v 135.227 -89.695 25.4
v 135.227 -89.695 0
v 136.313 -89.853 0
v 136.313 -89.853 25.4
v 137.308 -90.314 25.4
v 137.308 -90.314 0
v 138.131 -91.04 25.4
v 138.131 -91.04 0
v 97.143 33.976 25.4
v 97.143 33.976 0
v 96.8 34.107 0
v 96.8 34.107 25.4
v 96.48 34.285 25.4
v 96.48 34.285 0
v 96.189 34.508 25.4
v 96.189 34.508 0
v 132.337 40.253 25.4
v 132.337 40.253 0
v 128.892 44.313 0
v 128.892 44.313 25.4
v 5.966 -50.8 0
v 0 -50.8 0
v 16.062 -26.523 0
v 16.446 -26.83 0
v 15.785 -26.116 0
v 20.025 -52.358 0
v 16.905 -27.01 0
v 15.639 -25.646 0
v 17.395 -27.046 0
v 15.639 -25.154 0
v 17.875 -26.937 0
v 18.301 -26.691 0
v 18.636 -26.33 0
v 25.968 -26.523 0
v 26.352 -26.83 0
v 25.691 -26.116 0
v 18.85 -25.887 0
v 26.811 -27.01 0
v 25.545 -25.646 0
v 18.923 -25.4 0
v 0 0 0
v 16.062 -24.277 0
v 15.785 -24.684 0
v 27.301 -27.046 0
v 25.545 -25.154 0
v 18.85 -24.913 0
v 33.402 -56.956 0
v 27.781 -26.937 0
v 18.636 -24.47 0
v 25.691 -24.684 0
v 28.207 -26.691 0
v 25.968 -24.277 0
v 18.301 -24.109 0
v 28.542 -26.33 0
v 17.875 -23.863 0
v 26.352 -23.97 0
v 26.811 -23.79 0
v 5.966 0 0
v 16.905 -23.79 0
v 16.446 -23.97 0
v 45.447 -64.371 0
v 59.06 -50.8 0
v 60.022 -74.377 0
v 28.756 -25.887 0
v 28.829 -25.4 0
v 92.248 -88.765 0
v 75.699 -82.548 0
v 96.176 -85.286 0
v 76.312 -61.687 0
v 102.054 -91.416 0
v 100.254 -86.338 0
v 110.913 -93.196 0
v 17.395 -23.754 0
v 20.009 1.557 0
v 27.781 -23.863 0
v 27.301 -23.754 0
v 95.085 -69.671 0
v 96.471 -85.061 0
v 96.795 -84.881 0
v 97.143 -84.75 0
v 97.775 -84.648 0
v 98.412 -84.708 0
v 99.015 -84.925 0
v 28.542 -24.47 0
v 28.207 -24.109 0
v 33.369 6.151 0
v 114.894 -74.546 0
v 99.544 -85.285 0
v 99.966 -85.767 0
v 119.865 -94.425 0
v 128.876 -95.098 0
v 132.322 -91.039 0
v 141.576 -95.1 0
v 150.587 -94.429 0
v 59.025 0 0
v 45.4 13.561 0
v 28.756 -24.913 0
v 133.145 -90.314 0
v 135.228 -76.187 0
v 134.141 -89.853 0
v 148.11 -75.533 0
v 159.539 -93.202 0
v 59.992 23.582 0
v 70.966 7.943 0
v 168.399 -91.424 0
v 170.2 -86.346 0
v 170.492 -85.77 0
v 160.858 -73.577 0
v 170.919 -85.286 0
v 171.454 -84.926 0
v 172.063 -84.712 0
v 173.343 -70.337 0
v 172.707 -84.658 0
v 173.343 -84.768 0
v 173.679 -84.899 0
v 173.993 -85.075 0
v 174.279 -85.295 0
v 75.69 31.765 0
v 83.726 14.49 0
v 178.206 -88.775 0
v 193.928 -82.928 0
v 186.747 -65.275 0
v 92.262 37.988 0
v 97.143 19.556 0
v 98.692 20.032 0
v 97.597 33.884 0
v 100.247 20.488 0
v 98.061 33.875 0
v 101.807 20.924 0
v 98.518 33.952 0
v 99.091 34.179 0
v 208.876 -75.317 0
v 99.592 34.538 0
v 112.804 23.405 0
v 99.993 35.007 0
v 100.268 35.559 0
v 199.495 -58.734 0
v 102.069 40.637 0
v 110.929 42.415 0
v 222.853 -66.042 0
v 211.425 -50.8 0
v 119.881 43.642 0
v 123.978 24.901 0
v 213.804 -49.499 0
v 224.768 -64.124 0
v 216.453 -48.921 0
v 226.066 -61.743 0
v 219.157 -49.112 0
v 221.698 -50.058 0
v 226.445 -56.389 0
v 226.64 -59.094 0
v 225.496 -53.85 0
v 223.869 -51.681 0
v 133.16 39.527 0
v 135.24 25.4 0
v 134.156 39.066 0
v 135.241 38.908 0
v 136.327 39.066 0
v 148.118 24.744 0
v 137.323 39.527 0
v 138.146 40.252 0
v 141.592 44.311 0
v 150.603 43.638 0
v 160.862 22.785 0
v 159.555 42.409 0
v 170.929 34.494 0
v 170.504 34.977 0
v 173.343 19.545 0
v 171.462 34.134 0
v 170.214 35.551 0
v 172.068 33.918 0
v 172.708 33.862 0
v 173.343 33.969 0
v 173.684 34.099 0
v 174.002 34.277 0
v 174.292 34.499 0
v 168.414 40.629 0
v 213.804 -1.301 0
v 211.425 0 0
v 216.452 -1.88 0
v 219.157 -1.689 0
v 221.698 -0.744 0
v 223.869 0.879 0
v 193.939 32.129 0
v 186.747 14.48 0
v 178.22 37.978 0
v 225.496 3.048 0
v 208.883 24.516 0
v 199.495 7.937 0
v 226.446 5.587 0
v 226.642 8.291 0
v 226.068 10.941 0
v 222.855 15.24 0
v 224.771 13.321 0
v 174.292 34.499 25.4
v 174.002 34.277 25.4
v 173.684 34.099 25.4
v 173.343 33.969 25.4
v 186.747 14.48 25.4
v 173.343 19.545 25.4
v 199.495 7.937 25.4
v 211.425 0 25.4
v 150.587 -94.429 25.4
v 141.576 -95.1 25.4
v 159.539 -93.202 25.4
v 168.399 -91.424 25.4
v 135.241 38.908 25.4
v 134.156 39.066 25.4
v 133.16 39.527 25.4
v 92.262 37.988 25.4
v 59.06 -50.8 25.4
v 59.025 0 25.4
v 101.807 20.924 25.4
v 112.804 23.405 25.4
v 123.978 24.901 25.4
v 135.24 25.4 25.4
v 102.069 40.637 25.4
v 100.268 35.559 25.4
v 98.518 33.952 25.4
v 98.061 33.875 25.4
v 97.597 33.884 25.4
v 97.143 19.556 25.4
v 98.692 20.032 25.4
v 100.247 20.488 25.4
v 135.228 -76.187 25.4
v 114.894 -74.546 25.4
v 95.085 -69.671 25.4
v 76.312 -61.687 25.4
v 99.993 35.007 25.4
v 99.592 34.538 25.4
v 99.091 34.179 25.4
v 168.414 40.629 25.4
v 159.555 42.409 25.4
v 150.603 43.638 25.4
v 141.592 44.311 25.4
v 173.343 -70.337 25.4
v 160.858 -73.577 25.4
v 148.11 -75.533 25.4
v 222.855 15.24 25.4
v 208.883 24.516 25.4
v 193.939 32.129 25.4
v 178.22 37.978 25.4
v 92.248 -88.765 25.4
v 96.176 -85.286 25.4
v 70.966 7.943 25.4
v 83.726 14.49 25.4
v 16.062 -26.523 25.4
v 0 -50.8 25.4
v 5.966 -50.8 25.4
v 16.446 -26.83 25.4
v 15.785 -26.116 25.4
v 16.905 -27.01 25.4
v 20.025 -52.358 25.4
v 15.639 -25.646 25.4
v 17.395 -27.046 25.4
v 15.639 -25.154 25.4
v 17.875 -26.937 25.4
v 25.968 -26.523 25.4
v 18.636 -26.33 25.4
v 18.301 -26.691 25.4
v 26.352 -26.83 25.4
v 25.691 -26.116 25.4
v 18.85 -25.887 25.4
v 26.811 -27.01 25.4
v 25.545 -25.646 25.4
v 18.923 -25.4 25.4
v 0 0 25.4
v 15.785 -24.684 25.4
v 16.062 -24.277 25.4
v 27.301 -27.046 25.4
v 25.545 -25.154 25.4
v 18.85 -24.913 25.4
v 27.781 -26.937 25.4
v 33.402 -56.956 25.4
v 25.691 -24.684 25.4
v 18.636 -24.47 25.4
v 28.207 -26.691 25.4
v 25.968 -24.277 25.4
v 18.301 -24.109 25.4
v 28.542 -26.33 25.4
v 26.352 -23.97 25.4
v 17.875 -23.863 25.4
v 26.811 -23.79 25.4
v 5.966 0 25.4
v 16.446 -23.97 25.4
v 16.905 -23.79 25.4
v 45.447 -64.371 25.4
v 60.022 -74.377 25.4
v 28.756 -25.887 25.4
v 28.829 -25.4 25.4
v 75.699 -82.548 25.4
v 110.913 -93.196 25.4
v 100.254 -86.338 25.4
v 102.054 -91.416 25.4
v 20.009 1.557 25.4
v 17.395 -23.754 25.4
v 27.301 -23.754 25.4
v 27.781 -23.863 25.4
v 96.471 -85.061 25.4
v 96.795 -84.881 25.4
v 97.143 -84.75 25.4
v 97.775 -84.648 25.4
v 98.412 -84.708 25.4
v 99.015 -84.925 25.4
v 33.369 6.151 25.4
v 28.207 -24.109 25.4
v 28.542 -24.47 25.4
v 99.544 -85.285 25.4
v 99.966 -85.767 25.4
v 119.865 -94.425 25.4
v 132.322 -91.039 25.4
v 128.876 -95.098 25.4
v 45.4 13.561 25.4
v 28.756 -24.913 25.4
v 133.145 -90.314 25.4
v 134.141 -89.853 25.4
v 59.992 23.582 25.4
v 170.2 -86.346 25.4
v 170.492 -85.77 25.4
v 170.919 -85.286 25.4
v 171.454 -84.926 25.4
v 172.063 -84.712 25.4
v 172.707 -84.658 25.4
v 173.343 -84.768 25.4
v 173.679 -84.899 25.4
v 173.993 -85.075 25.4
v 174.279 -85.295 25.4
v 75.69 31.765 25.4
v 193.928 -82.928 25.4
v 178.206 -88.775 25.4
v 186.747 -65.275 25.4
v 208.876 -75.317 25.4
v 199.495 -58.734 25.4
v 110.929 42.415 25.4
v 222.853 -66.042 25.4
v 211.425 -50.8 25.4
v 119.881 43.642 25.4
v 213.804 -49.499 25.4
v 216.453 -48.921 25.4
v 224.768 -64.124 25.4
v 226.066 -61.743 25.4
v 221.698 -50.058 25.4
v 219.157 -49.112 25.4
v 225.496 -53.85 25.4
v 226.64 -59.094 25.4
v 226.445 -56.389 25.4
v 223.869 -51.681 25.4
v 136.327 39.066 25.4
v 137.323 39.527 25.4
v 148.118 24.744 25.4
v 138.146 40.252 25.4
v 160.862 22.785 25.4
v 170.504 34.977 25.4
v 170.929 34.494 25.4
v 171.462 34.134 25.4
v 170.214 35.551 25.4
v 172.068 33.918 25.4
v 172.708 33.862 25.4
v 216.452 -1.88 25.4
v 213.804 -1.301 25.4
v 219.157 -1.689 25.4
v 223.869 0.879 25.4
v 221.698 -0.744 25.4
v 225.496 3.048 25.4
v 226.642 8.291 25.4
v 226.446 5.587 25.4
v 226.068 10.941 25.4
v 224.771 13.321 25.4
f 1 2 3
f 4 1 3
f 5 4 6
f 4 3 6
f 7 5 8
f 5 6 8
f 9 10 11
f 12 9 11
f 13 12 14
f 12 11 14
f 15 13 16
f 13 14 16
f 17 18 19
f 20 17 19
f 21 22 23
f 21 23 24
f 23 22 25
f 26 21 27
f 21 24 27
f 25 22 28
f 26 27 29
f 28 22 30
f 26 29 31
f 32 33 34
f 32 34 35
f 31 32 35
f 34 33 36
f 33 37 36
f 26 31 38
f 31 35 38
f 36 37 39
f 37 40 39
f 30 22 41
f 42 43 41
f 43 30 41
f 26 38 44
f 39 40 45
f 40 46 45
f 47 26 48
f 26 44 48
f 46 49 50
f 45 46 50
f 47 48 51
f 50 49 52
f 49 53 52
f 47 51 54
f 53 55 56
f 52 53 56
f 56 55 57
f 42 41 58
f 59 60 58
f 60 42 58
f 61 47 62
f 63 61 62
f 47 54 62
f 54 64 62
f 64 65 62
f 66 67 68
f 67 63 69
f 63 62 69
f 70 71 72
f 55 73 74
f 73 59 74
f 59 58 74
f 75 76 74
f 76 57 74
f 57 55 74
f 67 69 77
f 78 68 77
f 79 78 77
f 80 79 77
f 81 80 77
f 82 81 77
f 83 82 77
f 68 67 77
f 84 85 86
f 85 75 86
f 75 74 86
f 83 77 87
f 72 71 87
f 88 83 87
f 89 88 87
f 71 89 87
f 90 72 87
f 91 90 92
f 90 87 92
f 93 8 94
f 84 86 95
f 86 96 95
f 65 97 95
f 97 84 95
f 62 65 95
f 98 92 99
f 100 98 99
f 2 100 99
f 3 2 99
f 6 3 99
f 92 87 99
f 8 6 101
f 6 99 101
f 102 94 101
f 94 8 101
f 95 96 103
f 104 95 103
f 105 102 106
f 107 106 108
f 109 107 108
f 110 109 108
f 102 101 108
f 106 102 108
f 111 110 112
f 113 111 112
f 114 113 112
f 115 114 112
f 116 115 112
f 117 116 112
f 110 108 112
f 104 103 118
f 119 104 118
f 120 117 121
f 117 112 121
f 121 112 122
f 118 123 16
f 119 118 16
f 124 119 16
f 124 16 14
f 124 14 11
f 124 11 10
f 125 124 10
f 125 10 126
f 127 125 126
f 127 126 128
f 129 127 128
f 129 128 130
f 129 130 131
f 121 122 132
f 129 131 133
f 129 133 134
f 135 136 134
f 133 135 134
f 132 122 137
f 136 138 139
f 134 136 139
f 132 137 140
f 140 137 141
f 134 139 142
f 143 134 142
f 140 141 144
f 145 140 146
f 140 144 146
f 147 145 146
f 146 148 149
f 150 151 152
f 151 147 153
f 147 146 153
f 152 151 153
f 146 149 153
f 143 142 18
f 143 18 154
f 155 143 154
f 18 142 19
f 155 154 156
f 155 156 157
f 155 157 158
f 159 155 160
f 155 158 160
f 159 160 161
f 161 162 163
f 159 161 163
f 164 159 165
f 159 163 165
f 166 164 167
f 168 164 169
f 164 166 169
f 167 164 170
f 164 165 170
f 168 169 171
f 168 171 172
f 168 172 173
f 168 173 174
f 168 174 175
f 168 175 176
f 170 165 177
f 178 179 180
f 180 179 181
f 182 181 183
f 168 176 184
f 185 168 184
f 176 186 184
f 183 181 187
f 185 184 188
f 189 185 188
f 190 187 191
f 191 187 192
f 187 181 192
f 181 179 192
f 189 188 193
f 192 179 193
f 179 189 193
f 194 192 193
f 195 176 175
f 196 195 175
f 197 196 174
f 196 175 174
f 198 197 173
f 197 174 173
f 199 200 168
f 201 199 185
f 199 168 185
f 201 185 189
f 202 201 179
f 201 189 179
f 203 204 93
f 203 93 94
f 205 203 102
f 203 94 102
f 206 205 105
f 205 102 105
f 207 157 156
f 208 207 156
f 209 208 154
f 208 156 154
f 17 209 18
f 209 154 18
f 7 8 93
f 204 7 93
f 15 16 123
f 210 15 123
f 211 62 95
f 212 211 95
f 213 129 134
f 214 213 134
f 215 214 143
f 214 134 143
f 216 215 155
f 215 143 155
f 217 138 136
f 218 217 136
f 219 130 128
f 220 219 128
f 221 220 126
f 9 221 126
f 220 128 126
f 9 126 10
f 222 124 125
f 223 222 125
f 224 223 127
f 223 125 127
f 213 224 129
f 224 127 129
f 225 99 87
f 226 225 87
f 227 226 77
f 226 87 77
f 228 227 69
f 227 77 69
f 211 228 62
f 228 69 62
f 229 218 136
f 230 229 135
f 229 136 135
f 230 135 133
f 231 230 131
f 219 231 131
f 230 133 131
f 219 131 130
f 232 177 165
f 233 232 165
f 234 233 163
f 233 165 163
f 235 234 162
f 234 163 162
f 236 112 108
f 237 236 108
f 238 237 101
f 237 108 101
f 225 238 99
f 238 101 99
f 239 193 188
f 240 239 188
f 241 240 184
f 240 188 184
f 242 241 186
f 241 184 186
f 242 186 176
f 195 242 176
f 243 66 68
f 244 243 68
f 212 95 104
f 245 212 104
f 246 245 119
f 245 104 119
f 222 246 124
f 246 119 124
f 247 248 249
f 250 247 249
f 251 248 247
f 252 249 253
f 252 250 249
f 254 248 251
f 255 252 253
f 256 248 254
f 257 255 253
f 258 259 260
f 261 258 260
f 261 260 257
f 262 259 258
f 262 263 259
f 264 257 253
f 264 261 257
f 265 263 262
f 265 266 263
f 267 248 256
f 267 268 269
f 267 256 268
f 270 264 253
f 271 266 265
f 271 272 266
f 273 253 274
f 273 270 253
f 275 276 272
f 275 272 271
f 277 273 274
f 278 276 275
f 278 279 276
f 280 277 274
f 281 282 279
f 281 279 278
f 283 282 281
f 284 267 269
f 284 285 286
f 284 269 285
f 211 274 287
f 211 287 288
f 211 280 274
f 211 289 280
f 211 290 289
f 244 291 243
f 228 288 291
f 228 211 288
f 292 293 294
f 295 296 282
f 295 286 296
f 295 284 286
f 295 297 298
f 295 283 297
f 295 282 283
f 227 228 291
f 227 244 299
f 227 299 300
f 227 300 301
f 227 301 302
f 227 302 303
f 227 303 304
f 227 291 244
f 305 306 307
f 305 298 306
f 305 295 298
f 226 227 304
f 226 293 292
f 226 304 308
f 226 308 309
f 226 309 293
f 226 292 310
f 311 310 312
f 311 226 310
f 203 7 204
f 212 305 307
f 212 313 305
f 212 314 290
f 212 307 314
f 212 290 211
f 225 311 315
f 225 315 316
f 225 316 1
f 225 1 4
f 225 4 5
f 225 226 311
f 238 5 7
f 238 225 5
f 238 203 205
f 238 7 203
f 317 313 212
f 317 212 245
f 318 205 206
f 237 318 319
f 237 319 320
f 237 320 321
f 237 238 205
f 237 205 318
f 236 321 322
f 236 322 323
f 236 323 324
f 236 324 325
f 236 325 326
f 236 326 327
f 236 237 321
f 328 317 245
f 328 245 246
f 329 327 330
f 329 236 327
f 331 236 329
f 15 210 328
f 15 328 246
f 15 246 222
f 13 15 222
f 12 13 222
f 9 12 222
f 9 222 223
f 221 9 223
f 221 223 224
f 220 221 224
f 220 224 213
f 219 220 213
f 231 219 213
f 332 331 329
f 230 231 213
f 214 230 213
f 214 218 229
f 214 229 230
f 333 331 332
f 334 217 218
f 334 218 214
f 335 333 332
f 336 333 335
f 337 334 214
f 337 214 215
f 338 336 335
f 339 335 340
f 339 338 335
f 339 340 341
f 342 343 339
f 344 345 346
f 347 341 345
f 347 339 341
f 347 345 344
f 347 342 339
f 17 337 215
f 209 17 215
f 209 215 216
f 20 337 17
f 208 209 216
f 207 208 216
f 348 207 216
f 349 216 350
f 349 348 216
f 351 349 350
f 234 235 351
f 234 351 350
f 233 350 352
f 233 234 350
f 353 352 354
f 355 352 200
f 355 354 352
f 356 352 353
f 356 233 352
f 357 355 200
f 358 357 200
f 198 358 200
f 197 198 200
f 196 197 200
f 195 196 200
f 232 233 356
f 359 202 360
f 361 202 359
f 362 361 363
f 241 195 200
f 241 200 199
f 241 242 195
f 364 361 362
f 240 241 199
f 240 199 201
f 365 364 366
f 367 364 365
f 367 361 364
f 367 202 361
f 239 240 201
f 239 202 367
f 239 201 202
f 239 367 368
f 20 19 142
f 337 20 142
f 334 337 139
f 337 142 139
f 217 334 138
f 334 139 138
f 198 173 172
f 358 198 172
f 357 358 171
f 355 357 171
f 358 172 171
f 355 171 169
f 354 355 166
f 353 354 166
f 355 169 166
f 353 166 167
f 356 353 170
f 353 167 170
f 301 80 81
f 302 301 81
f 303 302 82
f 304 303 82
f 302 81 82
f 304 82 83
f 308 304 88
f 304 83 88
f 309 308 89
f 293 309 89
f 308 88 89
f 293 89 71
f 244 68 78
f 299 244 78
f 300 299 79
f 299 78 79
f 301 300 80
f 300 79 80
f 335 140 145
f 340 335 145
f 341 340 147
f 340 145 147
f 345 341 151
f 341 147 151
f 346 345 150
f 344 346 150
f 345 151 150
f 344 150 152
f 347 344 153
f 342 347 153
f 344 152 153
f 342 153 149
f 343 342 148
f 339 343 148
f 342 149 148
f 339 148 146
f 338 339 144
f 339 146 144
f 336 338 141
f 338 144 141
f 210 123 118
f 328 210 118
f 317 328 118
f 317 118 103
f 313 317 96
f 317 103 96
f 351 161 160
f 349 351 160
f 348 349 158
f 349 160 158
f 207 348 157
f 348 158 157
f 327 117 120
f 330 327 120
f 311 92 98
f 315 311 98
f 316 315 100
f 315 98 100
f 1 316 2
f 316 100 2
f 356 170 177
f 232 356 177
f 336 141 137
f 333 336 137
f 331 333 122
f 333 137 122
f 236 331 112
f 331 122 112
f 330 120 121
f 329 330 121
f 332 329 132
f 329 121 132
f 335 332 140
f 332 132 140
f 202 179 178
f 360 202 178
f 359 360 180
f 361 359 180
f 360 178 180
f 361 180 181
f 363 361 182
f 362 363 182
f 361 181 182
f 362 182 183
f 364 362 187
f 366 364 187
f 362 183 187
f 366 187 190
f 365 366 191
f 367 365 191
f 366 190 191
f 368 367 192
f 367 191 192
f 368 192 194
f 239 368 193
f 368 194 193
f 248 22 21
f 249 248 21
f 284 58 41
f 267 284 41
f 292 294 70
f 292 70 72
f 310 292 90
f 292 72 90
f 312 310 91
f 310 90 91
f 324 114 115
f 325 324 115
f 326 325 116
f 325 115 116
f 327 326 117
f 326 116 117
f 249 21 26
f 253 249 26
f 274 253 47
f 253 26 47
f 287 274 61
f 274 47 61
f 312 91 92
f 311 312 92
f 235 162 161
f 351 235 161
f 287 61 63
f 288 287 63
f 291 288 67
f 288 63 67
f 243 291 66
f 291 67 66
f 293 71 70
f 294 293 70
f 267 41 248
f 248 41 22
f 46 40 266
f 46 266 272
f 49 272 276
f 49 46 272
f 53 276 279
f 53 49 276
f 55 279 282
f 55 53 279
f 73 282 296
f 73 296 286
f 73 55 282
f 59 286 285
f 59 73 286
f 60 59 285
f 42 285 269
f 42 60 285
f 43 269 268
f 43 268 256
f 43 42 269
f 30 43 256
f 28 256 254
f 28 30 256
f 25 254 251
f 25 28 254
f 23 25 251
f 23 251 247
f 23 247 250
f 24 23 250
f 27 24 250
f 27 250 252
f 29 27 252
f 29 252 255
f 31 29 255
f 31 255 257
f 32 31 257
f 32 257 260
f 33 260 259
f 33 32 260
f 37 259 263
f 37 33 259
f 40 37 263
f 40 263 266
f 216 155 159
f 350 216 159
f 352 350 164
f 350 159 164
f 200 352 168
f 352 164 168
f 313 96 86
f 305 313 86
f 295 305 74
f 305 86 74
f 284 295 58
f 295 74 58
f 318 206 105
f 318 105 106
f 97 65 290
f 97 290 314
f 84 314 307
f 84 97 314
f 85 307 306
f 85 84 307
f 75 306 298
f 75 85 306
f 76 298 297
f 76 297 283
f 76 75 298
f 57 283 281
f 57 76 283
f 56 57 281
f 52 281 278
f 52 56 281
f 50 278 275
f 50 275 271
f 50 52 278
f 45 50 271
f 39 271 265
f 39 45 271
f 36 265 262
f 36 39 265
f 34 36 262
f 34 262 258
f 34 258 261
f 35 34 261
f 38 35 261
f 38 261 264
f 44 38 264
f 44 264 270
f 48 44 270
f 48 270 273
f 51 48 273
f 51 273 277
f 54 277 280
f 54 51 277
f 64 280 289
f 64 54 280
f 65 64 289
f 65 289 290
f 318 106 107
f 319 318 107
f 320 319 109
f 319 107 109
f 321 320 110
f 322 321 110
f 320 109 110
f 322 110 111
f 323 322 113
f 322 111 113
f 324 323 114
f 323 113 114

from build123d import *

# Parameters (mm, degrees)
F0_R     = 1.651
F1_DEPTH = 25.4


with BuildPart() as f1:
    # F0 (on Top) → F1 (new body)
    with BuildSketch(Plane.XY):
        with BuildLine():
            Line((5.9660125897, 0), (0, 0))
            Line((0, 0), (0, -50.8))
            Line((0, -50.8), (5.9660125897, -50.8))
            ThreePointArc((5.9660125897, -50.8), (26.8404151011, -54.2874891517), (45.4474833472, -64.3711527752))
            ThreePointArc((45.4474833472, -64.3711527752), (67.7366219489, -78.6995467545), (92.2477625944, -88.7649606997))
            Line((92.2477625944, -88.7649606997), (96.1756392809, -85.285625491))
            ThreePointArc((96.1756392809, -85.285625491), (96.6297262922, -84.9647009914), (97.1427657695, -84.7502760791))
            Line((97.1427657695, -84.7502760791), (97.1427657695, -70.3371887059))
            ThreePointArc((97.1427657695, -70.3371887059), (77.2725114585, -62.1844747684), (59.0602220587, -50.8))
            Line((59.0602220587, -50.8), (59.0253094804, 0))
            ThreePointArc((59.0253094804, 0), (77.2534891322, 11.396761217), (97.1427657695, 19.555766947))
            Line((97.1427657695, 19.555766947), (97.1427657695, 33.9761360632))
            ThreePointArc((97.1427657695, 33.9761360632), (96.6371725478, 34.190077646), (96.1893595345, 34.5076607246))
            Line((96.1893595345, 34.5076607246), (92.2622799467, 37.987895583))
            ThreePointArc((92.2622799467, 37.987895583), (67.7168934482, 27.9114522536), (45.3996037793, 13.5605188218))
            ThreePointArc((45.3996037793, 13.5605188218), (26.8160472709, 3.4848333701), (5.9660125897, 0))
        make_face()
        with Locations((17.272, -25.4)):
            Circle(F0_R, mode=Mode.SUBTRACT)
        with Locations((27.178, -25.4)):
            Circle(F0_R, mode=Mode.SUBTRACT)
        with BuildLine():
            Line((173.3427657695, 33.9685711851), (173.3427657695, 19.5447874489))
            ThreePointArc((173.3427657695, 19.5447874489), (193.2134106927, 11.3884070061), (211.4253094804, 0))
            ThreePointArc((211.4253094804, 0), (224.7603094804, 1.905), (222.8553094804, 15.24))
            ThreePointArc((222.8553094804, 15.24), (201.5199367106, 28.5369467154), (178.2203126555, 37.9780505738))
            Line((178.2203126555, 37.9780505738), (174.292435969, 34.4987153651))
            ThreePointArc((174.292435969, 34.4987153651), (173.8463095868, 34.1822161077), (173.3427657695, 33.9685711851))
        make_face()
        with BuildLine():
            ThreePointArc((211.4253094804, -50.8), (193.2130200806, -62.1844747684), (173.3427657695, -70.3371887059))
            Line((173.3427657695, -70.3371887059), (173.3427657695, -84.7683622579))
            ThreePointArc((173.3427657695, -84.7683622579), (173.8388638616, -84.9814448856), (174.2787157154, -85.2945708506))
            Line((174.2787157154, -85.2945708506), (178.2057953033, -88.7748057089))
            ThreePointArc((178.2057953033, -88.7748057089), (201.5113077809, -79.337141934), (222.852691037, -66.0419634811))
            ThreePointArc((222.852691037, -66.0419634811), (224.7599819992, -52.7072909622), (211.4253094804, -50.8))
        make_face()
        with BuildLine():
            ThreePointArc((128.892021211, 44.312617548), (115.3953137669, 43.0975250998), (102.0693249913, 40.6367153465))
            Line((102.0693249913, 40.6367153465), (100.2677893758, 35.5592610119))
            ThreePointArc((100.2677893758, 35.5592610119), (99.5924476221, 34.538163122), (98.5179053993, 33.9515743424))
            Line((98.5179053993, 33.9515743424), (101.8073036013, 20.9244338206))
            ThreePointArc((101.8073036013, 20.9244338206), (118.374331468, 24.2771009359), (135.2398551386, 25.399999167))
            Line((135.2398551386, 25.399999167), (135.2414022457, 38.9079894532))
            ThreePointArc((135.2414022457, 38.9079894532), (133.6409701921, 39.2606320138), (132.3367275841, 40.2529478676))
            Line((132.3367275841, 40.2529478676), (128.892021211, 44.312617548))
        make_face()
        with BuildLine():
            ThreePointArc((98.5179053993, 33.9515743424), (97.8286414895, 33.8690077361), (97.1427657695, 33.9761360632))
            Line((97.1427657695, 33.9761360632), (97.1427657695, 19.555766947))
            ThreePointArc((97.1427657695, 19.555766947), (99.468485514, 20.2624205399), (101.8073036013, 20.9244338206))
            Line((101.8073036013, 20.9244338206), (98.5179053993, 33.9515743424))
        make_face()
        with BuildLine():
            Line((135.2414022457, 38.9079894532), (135.2398551386, 25.399999167))
            ThreePointArc((135.2398551386, 25.399999167), (154.5147695349, 23.9265578705), (173.3427657695, 19.5447874489))
            Line((173.3427657695, 19.5447874489), (173.3427657695, 33.9685711851))
            ThreePointArc((173.3427657695, 33.9685711851), (171.46164391, 34.1335607927), (170.2142471201, 35.5512498522))
            Line((170.2142471201, 35.5512498522), (168.4138746214, 40.6291167233))
            ThreePointArc((168.4138746214, 40.6291167233), (155.088449882, 43.092978936), (141.5920211277, 44.3111629821))
            Line((141.5920211277, 44.3111629821), (138.1463849147, 40.2522824716))
            ThreePointArc((138.1463849147, 40.2522824716), (136.8419150357, 39.2602654008), (135.2414022457, 38.9079894532))
        make_face()
        with BuildLine():
            ThreePointArc((173.3427657695, -70.3371887059), (154.5088049536, -74.7170648066), (135.2282201113, -76.186909293))
            Line((135.2282201113, -76.186909293), (135.2266730042, -89.6948995791))
            ThreePointArc((135.2266730042, -89.6948995791), (136.8271050578, -90.0475421398), (138.1313476658, -91.0398579935))
            Line((138.1313476658, -91.0398579935), (141.5760540389, -95.0995276739))
            ThreePointArc((141.5760540389, -95.0995276739), (155.072761483, -93.8844352257), (168.3987502586, -91.4236254724))
            Line((168.3987502586, -91.4236254724), (170.2002858741, -86.3461711378))
            ThreePointArc((170.2002858741, -86.3461711378), (171.4543564481, -84.9255689093), (173.3427657695, -84.7683622579))
            Line((173.3427657695, -84.7683622579), (173.3427657695, -70.3371887059))
        make_face()
        with BuildLine():
            Line((100.2538281298, -86.3381599782), (102.0542006285, -91.4160268492))
            ThreePointArc((102.0542006285, -91.4160268492), (115.3796253679, -93.879889062), (128.8760541222, -95.0980731081))
            Line((128.8760541222, -95.0980731081), (132.3216903352, -91.0391925976))
            ThreePointArc((132.3216903352, -91.0391925976), (133.6261602142, -90.0471755268), (135.2266730042, -89.6948995791))
            Line((135.2266730042, -89.6948995791), (135.2282201113, -76.186909293))
            ThreePointArc((135.2282201113, -76.186909293), (115.962349399, -74.714857391), (97.1427657695, -70.3371887059))
            Line((97.1427657695, -70.3371887059), (97.1427657695, -84.7502760791))
            ThreePointArc((97.1427657695, -84.7502760791), (99.0145511059, -84.9245969075), (100.2538281298, -86.3381599782))
        make_face()
    extrude(amount=F1_DEPTH)


solid = f1.part
